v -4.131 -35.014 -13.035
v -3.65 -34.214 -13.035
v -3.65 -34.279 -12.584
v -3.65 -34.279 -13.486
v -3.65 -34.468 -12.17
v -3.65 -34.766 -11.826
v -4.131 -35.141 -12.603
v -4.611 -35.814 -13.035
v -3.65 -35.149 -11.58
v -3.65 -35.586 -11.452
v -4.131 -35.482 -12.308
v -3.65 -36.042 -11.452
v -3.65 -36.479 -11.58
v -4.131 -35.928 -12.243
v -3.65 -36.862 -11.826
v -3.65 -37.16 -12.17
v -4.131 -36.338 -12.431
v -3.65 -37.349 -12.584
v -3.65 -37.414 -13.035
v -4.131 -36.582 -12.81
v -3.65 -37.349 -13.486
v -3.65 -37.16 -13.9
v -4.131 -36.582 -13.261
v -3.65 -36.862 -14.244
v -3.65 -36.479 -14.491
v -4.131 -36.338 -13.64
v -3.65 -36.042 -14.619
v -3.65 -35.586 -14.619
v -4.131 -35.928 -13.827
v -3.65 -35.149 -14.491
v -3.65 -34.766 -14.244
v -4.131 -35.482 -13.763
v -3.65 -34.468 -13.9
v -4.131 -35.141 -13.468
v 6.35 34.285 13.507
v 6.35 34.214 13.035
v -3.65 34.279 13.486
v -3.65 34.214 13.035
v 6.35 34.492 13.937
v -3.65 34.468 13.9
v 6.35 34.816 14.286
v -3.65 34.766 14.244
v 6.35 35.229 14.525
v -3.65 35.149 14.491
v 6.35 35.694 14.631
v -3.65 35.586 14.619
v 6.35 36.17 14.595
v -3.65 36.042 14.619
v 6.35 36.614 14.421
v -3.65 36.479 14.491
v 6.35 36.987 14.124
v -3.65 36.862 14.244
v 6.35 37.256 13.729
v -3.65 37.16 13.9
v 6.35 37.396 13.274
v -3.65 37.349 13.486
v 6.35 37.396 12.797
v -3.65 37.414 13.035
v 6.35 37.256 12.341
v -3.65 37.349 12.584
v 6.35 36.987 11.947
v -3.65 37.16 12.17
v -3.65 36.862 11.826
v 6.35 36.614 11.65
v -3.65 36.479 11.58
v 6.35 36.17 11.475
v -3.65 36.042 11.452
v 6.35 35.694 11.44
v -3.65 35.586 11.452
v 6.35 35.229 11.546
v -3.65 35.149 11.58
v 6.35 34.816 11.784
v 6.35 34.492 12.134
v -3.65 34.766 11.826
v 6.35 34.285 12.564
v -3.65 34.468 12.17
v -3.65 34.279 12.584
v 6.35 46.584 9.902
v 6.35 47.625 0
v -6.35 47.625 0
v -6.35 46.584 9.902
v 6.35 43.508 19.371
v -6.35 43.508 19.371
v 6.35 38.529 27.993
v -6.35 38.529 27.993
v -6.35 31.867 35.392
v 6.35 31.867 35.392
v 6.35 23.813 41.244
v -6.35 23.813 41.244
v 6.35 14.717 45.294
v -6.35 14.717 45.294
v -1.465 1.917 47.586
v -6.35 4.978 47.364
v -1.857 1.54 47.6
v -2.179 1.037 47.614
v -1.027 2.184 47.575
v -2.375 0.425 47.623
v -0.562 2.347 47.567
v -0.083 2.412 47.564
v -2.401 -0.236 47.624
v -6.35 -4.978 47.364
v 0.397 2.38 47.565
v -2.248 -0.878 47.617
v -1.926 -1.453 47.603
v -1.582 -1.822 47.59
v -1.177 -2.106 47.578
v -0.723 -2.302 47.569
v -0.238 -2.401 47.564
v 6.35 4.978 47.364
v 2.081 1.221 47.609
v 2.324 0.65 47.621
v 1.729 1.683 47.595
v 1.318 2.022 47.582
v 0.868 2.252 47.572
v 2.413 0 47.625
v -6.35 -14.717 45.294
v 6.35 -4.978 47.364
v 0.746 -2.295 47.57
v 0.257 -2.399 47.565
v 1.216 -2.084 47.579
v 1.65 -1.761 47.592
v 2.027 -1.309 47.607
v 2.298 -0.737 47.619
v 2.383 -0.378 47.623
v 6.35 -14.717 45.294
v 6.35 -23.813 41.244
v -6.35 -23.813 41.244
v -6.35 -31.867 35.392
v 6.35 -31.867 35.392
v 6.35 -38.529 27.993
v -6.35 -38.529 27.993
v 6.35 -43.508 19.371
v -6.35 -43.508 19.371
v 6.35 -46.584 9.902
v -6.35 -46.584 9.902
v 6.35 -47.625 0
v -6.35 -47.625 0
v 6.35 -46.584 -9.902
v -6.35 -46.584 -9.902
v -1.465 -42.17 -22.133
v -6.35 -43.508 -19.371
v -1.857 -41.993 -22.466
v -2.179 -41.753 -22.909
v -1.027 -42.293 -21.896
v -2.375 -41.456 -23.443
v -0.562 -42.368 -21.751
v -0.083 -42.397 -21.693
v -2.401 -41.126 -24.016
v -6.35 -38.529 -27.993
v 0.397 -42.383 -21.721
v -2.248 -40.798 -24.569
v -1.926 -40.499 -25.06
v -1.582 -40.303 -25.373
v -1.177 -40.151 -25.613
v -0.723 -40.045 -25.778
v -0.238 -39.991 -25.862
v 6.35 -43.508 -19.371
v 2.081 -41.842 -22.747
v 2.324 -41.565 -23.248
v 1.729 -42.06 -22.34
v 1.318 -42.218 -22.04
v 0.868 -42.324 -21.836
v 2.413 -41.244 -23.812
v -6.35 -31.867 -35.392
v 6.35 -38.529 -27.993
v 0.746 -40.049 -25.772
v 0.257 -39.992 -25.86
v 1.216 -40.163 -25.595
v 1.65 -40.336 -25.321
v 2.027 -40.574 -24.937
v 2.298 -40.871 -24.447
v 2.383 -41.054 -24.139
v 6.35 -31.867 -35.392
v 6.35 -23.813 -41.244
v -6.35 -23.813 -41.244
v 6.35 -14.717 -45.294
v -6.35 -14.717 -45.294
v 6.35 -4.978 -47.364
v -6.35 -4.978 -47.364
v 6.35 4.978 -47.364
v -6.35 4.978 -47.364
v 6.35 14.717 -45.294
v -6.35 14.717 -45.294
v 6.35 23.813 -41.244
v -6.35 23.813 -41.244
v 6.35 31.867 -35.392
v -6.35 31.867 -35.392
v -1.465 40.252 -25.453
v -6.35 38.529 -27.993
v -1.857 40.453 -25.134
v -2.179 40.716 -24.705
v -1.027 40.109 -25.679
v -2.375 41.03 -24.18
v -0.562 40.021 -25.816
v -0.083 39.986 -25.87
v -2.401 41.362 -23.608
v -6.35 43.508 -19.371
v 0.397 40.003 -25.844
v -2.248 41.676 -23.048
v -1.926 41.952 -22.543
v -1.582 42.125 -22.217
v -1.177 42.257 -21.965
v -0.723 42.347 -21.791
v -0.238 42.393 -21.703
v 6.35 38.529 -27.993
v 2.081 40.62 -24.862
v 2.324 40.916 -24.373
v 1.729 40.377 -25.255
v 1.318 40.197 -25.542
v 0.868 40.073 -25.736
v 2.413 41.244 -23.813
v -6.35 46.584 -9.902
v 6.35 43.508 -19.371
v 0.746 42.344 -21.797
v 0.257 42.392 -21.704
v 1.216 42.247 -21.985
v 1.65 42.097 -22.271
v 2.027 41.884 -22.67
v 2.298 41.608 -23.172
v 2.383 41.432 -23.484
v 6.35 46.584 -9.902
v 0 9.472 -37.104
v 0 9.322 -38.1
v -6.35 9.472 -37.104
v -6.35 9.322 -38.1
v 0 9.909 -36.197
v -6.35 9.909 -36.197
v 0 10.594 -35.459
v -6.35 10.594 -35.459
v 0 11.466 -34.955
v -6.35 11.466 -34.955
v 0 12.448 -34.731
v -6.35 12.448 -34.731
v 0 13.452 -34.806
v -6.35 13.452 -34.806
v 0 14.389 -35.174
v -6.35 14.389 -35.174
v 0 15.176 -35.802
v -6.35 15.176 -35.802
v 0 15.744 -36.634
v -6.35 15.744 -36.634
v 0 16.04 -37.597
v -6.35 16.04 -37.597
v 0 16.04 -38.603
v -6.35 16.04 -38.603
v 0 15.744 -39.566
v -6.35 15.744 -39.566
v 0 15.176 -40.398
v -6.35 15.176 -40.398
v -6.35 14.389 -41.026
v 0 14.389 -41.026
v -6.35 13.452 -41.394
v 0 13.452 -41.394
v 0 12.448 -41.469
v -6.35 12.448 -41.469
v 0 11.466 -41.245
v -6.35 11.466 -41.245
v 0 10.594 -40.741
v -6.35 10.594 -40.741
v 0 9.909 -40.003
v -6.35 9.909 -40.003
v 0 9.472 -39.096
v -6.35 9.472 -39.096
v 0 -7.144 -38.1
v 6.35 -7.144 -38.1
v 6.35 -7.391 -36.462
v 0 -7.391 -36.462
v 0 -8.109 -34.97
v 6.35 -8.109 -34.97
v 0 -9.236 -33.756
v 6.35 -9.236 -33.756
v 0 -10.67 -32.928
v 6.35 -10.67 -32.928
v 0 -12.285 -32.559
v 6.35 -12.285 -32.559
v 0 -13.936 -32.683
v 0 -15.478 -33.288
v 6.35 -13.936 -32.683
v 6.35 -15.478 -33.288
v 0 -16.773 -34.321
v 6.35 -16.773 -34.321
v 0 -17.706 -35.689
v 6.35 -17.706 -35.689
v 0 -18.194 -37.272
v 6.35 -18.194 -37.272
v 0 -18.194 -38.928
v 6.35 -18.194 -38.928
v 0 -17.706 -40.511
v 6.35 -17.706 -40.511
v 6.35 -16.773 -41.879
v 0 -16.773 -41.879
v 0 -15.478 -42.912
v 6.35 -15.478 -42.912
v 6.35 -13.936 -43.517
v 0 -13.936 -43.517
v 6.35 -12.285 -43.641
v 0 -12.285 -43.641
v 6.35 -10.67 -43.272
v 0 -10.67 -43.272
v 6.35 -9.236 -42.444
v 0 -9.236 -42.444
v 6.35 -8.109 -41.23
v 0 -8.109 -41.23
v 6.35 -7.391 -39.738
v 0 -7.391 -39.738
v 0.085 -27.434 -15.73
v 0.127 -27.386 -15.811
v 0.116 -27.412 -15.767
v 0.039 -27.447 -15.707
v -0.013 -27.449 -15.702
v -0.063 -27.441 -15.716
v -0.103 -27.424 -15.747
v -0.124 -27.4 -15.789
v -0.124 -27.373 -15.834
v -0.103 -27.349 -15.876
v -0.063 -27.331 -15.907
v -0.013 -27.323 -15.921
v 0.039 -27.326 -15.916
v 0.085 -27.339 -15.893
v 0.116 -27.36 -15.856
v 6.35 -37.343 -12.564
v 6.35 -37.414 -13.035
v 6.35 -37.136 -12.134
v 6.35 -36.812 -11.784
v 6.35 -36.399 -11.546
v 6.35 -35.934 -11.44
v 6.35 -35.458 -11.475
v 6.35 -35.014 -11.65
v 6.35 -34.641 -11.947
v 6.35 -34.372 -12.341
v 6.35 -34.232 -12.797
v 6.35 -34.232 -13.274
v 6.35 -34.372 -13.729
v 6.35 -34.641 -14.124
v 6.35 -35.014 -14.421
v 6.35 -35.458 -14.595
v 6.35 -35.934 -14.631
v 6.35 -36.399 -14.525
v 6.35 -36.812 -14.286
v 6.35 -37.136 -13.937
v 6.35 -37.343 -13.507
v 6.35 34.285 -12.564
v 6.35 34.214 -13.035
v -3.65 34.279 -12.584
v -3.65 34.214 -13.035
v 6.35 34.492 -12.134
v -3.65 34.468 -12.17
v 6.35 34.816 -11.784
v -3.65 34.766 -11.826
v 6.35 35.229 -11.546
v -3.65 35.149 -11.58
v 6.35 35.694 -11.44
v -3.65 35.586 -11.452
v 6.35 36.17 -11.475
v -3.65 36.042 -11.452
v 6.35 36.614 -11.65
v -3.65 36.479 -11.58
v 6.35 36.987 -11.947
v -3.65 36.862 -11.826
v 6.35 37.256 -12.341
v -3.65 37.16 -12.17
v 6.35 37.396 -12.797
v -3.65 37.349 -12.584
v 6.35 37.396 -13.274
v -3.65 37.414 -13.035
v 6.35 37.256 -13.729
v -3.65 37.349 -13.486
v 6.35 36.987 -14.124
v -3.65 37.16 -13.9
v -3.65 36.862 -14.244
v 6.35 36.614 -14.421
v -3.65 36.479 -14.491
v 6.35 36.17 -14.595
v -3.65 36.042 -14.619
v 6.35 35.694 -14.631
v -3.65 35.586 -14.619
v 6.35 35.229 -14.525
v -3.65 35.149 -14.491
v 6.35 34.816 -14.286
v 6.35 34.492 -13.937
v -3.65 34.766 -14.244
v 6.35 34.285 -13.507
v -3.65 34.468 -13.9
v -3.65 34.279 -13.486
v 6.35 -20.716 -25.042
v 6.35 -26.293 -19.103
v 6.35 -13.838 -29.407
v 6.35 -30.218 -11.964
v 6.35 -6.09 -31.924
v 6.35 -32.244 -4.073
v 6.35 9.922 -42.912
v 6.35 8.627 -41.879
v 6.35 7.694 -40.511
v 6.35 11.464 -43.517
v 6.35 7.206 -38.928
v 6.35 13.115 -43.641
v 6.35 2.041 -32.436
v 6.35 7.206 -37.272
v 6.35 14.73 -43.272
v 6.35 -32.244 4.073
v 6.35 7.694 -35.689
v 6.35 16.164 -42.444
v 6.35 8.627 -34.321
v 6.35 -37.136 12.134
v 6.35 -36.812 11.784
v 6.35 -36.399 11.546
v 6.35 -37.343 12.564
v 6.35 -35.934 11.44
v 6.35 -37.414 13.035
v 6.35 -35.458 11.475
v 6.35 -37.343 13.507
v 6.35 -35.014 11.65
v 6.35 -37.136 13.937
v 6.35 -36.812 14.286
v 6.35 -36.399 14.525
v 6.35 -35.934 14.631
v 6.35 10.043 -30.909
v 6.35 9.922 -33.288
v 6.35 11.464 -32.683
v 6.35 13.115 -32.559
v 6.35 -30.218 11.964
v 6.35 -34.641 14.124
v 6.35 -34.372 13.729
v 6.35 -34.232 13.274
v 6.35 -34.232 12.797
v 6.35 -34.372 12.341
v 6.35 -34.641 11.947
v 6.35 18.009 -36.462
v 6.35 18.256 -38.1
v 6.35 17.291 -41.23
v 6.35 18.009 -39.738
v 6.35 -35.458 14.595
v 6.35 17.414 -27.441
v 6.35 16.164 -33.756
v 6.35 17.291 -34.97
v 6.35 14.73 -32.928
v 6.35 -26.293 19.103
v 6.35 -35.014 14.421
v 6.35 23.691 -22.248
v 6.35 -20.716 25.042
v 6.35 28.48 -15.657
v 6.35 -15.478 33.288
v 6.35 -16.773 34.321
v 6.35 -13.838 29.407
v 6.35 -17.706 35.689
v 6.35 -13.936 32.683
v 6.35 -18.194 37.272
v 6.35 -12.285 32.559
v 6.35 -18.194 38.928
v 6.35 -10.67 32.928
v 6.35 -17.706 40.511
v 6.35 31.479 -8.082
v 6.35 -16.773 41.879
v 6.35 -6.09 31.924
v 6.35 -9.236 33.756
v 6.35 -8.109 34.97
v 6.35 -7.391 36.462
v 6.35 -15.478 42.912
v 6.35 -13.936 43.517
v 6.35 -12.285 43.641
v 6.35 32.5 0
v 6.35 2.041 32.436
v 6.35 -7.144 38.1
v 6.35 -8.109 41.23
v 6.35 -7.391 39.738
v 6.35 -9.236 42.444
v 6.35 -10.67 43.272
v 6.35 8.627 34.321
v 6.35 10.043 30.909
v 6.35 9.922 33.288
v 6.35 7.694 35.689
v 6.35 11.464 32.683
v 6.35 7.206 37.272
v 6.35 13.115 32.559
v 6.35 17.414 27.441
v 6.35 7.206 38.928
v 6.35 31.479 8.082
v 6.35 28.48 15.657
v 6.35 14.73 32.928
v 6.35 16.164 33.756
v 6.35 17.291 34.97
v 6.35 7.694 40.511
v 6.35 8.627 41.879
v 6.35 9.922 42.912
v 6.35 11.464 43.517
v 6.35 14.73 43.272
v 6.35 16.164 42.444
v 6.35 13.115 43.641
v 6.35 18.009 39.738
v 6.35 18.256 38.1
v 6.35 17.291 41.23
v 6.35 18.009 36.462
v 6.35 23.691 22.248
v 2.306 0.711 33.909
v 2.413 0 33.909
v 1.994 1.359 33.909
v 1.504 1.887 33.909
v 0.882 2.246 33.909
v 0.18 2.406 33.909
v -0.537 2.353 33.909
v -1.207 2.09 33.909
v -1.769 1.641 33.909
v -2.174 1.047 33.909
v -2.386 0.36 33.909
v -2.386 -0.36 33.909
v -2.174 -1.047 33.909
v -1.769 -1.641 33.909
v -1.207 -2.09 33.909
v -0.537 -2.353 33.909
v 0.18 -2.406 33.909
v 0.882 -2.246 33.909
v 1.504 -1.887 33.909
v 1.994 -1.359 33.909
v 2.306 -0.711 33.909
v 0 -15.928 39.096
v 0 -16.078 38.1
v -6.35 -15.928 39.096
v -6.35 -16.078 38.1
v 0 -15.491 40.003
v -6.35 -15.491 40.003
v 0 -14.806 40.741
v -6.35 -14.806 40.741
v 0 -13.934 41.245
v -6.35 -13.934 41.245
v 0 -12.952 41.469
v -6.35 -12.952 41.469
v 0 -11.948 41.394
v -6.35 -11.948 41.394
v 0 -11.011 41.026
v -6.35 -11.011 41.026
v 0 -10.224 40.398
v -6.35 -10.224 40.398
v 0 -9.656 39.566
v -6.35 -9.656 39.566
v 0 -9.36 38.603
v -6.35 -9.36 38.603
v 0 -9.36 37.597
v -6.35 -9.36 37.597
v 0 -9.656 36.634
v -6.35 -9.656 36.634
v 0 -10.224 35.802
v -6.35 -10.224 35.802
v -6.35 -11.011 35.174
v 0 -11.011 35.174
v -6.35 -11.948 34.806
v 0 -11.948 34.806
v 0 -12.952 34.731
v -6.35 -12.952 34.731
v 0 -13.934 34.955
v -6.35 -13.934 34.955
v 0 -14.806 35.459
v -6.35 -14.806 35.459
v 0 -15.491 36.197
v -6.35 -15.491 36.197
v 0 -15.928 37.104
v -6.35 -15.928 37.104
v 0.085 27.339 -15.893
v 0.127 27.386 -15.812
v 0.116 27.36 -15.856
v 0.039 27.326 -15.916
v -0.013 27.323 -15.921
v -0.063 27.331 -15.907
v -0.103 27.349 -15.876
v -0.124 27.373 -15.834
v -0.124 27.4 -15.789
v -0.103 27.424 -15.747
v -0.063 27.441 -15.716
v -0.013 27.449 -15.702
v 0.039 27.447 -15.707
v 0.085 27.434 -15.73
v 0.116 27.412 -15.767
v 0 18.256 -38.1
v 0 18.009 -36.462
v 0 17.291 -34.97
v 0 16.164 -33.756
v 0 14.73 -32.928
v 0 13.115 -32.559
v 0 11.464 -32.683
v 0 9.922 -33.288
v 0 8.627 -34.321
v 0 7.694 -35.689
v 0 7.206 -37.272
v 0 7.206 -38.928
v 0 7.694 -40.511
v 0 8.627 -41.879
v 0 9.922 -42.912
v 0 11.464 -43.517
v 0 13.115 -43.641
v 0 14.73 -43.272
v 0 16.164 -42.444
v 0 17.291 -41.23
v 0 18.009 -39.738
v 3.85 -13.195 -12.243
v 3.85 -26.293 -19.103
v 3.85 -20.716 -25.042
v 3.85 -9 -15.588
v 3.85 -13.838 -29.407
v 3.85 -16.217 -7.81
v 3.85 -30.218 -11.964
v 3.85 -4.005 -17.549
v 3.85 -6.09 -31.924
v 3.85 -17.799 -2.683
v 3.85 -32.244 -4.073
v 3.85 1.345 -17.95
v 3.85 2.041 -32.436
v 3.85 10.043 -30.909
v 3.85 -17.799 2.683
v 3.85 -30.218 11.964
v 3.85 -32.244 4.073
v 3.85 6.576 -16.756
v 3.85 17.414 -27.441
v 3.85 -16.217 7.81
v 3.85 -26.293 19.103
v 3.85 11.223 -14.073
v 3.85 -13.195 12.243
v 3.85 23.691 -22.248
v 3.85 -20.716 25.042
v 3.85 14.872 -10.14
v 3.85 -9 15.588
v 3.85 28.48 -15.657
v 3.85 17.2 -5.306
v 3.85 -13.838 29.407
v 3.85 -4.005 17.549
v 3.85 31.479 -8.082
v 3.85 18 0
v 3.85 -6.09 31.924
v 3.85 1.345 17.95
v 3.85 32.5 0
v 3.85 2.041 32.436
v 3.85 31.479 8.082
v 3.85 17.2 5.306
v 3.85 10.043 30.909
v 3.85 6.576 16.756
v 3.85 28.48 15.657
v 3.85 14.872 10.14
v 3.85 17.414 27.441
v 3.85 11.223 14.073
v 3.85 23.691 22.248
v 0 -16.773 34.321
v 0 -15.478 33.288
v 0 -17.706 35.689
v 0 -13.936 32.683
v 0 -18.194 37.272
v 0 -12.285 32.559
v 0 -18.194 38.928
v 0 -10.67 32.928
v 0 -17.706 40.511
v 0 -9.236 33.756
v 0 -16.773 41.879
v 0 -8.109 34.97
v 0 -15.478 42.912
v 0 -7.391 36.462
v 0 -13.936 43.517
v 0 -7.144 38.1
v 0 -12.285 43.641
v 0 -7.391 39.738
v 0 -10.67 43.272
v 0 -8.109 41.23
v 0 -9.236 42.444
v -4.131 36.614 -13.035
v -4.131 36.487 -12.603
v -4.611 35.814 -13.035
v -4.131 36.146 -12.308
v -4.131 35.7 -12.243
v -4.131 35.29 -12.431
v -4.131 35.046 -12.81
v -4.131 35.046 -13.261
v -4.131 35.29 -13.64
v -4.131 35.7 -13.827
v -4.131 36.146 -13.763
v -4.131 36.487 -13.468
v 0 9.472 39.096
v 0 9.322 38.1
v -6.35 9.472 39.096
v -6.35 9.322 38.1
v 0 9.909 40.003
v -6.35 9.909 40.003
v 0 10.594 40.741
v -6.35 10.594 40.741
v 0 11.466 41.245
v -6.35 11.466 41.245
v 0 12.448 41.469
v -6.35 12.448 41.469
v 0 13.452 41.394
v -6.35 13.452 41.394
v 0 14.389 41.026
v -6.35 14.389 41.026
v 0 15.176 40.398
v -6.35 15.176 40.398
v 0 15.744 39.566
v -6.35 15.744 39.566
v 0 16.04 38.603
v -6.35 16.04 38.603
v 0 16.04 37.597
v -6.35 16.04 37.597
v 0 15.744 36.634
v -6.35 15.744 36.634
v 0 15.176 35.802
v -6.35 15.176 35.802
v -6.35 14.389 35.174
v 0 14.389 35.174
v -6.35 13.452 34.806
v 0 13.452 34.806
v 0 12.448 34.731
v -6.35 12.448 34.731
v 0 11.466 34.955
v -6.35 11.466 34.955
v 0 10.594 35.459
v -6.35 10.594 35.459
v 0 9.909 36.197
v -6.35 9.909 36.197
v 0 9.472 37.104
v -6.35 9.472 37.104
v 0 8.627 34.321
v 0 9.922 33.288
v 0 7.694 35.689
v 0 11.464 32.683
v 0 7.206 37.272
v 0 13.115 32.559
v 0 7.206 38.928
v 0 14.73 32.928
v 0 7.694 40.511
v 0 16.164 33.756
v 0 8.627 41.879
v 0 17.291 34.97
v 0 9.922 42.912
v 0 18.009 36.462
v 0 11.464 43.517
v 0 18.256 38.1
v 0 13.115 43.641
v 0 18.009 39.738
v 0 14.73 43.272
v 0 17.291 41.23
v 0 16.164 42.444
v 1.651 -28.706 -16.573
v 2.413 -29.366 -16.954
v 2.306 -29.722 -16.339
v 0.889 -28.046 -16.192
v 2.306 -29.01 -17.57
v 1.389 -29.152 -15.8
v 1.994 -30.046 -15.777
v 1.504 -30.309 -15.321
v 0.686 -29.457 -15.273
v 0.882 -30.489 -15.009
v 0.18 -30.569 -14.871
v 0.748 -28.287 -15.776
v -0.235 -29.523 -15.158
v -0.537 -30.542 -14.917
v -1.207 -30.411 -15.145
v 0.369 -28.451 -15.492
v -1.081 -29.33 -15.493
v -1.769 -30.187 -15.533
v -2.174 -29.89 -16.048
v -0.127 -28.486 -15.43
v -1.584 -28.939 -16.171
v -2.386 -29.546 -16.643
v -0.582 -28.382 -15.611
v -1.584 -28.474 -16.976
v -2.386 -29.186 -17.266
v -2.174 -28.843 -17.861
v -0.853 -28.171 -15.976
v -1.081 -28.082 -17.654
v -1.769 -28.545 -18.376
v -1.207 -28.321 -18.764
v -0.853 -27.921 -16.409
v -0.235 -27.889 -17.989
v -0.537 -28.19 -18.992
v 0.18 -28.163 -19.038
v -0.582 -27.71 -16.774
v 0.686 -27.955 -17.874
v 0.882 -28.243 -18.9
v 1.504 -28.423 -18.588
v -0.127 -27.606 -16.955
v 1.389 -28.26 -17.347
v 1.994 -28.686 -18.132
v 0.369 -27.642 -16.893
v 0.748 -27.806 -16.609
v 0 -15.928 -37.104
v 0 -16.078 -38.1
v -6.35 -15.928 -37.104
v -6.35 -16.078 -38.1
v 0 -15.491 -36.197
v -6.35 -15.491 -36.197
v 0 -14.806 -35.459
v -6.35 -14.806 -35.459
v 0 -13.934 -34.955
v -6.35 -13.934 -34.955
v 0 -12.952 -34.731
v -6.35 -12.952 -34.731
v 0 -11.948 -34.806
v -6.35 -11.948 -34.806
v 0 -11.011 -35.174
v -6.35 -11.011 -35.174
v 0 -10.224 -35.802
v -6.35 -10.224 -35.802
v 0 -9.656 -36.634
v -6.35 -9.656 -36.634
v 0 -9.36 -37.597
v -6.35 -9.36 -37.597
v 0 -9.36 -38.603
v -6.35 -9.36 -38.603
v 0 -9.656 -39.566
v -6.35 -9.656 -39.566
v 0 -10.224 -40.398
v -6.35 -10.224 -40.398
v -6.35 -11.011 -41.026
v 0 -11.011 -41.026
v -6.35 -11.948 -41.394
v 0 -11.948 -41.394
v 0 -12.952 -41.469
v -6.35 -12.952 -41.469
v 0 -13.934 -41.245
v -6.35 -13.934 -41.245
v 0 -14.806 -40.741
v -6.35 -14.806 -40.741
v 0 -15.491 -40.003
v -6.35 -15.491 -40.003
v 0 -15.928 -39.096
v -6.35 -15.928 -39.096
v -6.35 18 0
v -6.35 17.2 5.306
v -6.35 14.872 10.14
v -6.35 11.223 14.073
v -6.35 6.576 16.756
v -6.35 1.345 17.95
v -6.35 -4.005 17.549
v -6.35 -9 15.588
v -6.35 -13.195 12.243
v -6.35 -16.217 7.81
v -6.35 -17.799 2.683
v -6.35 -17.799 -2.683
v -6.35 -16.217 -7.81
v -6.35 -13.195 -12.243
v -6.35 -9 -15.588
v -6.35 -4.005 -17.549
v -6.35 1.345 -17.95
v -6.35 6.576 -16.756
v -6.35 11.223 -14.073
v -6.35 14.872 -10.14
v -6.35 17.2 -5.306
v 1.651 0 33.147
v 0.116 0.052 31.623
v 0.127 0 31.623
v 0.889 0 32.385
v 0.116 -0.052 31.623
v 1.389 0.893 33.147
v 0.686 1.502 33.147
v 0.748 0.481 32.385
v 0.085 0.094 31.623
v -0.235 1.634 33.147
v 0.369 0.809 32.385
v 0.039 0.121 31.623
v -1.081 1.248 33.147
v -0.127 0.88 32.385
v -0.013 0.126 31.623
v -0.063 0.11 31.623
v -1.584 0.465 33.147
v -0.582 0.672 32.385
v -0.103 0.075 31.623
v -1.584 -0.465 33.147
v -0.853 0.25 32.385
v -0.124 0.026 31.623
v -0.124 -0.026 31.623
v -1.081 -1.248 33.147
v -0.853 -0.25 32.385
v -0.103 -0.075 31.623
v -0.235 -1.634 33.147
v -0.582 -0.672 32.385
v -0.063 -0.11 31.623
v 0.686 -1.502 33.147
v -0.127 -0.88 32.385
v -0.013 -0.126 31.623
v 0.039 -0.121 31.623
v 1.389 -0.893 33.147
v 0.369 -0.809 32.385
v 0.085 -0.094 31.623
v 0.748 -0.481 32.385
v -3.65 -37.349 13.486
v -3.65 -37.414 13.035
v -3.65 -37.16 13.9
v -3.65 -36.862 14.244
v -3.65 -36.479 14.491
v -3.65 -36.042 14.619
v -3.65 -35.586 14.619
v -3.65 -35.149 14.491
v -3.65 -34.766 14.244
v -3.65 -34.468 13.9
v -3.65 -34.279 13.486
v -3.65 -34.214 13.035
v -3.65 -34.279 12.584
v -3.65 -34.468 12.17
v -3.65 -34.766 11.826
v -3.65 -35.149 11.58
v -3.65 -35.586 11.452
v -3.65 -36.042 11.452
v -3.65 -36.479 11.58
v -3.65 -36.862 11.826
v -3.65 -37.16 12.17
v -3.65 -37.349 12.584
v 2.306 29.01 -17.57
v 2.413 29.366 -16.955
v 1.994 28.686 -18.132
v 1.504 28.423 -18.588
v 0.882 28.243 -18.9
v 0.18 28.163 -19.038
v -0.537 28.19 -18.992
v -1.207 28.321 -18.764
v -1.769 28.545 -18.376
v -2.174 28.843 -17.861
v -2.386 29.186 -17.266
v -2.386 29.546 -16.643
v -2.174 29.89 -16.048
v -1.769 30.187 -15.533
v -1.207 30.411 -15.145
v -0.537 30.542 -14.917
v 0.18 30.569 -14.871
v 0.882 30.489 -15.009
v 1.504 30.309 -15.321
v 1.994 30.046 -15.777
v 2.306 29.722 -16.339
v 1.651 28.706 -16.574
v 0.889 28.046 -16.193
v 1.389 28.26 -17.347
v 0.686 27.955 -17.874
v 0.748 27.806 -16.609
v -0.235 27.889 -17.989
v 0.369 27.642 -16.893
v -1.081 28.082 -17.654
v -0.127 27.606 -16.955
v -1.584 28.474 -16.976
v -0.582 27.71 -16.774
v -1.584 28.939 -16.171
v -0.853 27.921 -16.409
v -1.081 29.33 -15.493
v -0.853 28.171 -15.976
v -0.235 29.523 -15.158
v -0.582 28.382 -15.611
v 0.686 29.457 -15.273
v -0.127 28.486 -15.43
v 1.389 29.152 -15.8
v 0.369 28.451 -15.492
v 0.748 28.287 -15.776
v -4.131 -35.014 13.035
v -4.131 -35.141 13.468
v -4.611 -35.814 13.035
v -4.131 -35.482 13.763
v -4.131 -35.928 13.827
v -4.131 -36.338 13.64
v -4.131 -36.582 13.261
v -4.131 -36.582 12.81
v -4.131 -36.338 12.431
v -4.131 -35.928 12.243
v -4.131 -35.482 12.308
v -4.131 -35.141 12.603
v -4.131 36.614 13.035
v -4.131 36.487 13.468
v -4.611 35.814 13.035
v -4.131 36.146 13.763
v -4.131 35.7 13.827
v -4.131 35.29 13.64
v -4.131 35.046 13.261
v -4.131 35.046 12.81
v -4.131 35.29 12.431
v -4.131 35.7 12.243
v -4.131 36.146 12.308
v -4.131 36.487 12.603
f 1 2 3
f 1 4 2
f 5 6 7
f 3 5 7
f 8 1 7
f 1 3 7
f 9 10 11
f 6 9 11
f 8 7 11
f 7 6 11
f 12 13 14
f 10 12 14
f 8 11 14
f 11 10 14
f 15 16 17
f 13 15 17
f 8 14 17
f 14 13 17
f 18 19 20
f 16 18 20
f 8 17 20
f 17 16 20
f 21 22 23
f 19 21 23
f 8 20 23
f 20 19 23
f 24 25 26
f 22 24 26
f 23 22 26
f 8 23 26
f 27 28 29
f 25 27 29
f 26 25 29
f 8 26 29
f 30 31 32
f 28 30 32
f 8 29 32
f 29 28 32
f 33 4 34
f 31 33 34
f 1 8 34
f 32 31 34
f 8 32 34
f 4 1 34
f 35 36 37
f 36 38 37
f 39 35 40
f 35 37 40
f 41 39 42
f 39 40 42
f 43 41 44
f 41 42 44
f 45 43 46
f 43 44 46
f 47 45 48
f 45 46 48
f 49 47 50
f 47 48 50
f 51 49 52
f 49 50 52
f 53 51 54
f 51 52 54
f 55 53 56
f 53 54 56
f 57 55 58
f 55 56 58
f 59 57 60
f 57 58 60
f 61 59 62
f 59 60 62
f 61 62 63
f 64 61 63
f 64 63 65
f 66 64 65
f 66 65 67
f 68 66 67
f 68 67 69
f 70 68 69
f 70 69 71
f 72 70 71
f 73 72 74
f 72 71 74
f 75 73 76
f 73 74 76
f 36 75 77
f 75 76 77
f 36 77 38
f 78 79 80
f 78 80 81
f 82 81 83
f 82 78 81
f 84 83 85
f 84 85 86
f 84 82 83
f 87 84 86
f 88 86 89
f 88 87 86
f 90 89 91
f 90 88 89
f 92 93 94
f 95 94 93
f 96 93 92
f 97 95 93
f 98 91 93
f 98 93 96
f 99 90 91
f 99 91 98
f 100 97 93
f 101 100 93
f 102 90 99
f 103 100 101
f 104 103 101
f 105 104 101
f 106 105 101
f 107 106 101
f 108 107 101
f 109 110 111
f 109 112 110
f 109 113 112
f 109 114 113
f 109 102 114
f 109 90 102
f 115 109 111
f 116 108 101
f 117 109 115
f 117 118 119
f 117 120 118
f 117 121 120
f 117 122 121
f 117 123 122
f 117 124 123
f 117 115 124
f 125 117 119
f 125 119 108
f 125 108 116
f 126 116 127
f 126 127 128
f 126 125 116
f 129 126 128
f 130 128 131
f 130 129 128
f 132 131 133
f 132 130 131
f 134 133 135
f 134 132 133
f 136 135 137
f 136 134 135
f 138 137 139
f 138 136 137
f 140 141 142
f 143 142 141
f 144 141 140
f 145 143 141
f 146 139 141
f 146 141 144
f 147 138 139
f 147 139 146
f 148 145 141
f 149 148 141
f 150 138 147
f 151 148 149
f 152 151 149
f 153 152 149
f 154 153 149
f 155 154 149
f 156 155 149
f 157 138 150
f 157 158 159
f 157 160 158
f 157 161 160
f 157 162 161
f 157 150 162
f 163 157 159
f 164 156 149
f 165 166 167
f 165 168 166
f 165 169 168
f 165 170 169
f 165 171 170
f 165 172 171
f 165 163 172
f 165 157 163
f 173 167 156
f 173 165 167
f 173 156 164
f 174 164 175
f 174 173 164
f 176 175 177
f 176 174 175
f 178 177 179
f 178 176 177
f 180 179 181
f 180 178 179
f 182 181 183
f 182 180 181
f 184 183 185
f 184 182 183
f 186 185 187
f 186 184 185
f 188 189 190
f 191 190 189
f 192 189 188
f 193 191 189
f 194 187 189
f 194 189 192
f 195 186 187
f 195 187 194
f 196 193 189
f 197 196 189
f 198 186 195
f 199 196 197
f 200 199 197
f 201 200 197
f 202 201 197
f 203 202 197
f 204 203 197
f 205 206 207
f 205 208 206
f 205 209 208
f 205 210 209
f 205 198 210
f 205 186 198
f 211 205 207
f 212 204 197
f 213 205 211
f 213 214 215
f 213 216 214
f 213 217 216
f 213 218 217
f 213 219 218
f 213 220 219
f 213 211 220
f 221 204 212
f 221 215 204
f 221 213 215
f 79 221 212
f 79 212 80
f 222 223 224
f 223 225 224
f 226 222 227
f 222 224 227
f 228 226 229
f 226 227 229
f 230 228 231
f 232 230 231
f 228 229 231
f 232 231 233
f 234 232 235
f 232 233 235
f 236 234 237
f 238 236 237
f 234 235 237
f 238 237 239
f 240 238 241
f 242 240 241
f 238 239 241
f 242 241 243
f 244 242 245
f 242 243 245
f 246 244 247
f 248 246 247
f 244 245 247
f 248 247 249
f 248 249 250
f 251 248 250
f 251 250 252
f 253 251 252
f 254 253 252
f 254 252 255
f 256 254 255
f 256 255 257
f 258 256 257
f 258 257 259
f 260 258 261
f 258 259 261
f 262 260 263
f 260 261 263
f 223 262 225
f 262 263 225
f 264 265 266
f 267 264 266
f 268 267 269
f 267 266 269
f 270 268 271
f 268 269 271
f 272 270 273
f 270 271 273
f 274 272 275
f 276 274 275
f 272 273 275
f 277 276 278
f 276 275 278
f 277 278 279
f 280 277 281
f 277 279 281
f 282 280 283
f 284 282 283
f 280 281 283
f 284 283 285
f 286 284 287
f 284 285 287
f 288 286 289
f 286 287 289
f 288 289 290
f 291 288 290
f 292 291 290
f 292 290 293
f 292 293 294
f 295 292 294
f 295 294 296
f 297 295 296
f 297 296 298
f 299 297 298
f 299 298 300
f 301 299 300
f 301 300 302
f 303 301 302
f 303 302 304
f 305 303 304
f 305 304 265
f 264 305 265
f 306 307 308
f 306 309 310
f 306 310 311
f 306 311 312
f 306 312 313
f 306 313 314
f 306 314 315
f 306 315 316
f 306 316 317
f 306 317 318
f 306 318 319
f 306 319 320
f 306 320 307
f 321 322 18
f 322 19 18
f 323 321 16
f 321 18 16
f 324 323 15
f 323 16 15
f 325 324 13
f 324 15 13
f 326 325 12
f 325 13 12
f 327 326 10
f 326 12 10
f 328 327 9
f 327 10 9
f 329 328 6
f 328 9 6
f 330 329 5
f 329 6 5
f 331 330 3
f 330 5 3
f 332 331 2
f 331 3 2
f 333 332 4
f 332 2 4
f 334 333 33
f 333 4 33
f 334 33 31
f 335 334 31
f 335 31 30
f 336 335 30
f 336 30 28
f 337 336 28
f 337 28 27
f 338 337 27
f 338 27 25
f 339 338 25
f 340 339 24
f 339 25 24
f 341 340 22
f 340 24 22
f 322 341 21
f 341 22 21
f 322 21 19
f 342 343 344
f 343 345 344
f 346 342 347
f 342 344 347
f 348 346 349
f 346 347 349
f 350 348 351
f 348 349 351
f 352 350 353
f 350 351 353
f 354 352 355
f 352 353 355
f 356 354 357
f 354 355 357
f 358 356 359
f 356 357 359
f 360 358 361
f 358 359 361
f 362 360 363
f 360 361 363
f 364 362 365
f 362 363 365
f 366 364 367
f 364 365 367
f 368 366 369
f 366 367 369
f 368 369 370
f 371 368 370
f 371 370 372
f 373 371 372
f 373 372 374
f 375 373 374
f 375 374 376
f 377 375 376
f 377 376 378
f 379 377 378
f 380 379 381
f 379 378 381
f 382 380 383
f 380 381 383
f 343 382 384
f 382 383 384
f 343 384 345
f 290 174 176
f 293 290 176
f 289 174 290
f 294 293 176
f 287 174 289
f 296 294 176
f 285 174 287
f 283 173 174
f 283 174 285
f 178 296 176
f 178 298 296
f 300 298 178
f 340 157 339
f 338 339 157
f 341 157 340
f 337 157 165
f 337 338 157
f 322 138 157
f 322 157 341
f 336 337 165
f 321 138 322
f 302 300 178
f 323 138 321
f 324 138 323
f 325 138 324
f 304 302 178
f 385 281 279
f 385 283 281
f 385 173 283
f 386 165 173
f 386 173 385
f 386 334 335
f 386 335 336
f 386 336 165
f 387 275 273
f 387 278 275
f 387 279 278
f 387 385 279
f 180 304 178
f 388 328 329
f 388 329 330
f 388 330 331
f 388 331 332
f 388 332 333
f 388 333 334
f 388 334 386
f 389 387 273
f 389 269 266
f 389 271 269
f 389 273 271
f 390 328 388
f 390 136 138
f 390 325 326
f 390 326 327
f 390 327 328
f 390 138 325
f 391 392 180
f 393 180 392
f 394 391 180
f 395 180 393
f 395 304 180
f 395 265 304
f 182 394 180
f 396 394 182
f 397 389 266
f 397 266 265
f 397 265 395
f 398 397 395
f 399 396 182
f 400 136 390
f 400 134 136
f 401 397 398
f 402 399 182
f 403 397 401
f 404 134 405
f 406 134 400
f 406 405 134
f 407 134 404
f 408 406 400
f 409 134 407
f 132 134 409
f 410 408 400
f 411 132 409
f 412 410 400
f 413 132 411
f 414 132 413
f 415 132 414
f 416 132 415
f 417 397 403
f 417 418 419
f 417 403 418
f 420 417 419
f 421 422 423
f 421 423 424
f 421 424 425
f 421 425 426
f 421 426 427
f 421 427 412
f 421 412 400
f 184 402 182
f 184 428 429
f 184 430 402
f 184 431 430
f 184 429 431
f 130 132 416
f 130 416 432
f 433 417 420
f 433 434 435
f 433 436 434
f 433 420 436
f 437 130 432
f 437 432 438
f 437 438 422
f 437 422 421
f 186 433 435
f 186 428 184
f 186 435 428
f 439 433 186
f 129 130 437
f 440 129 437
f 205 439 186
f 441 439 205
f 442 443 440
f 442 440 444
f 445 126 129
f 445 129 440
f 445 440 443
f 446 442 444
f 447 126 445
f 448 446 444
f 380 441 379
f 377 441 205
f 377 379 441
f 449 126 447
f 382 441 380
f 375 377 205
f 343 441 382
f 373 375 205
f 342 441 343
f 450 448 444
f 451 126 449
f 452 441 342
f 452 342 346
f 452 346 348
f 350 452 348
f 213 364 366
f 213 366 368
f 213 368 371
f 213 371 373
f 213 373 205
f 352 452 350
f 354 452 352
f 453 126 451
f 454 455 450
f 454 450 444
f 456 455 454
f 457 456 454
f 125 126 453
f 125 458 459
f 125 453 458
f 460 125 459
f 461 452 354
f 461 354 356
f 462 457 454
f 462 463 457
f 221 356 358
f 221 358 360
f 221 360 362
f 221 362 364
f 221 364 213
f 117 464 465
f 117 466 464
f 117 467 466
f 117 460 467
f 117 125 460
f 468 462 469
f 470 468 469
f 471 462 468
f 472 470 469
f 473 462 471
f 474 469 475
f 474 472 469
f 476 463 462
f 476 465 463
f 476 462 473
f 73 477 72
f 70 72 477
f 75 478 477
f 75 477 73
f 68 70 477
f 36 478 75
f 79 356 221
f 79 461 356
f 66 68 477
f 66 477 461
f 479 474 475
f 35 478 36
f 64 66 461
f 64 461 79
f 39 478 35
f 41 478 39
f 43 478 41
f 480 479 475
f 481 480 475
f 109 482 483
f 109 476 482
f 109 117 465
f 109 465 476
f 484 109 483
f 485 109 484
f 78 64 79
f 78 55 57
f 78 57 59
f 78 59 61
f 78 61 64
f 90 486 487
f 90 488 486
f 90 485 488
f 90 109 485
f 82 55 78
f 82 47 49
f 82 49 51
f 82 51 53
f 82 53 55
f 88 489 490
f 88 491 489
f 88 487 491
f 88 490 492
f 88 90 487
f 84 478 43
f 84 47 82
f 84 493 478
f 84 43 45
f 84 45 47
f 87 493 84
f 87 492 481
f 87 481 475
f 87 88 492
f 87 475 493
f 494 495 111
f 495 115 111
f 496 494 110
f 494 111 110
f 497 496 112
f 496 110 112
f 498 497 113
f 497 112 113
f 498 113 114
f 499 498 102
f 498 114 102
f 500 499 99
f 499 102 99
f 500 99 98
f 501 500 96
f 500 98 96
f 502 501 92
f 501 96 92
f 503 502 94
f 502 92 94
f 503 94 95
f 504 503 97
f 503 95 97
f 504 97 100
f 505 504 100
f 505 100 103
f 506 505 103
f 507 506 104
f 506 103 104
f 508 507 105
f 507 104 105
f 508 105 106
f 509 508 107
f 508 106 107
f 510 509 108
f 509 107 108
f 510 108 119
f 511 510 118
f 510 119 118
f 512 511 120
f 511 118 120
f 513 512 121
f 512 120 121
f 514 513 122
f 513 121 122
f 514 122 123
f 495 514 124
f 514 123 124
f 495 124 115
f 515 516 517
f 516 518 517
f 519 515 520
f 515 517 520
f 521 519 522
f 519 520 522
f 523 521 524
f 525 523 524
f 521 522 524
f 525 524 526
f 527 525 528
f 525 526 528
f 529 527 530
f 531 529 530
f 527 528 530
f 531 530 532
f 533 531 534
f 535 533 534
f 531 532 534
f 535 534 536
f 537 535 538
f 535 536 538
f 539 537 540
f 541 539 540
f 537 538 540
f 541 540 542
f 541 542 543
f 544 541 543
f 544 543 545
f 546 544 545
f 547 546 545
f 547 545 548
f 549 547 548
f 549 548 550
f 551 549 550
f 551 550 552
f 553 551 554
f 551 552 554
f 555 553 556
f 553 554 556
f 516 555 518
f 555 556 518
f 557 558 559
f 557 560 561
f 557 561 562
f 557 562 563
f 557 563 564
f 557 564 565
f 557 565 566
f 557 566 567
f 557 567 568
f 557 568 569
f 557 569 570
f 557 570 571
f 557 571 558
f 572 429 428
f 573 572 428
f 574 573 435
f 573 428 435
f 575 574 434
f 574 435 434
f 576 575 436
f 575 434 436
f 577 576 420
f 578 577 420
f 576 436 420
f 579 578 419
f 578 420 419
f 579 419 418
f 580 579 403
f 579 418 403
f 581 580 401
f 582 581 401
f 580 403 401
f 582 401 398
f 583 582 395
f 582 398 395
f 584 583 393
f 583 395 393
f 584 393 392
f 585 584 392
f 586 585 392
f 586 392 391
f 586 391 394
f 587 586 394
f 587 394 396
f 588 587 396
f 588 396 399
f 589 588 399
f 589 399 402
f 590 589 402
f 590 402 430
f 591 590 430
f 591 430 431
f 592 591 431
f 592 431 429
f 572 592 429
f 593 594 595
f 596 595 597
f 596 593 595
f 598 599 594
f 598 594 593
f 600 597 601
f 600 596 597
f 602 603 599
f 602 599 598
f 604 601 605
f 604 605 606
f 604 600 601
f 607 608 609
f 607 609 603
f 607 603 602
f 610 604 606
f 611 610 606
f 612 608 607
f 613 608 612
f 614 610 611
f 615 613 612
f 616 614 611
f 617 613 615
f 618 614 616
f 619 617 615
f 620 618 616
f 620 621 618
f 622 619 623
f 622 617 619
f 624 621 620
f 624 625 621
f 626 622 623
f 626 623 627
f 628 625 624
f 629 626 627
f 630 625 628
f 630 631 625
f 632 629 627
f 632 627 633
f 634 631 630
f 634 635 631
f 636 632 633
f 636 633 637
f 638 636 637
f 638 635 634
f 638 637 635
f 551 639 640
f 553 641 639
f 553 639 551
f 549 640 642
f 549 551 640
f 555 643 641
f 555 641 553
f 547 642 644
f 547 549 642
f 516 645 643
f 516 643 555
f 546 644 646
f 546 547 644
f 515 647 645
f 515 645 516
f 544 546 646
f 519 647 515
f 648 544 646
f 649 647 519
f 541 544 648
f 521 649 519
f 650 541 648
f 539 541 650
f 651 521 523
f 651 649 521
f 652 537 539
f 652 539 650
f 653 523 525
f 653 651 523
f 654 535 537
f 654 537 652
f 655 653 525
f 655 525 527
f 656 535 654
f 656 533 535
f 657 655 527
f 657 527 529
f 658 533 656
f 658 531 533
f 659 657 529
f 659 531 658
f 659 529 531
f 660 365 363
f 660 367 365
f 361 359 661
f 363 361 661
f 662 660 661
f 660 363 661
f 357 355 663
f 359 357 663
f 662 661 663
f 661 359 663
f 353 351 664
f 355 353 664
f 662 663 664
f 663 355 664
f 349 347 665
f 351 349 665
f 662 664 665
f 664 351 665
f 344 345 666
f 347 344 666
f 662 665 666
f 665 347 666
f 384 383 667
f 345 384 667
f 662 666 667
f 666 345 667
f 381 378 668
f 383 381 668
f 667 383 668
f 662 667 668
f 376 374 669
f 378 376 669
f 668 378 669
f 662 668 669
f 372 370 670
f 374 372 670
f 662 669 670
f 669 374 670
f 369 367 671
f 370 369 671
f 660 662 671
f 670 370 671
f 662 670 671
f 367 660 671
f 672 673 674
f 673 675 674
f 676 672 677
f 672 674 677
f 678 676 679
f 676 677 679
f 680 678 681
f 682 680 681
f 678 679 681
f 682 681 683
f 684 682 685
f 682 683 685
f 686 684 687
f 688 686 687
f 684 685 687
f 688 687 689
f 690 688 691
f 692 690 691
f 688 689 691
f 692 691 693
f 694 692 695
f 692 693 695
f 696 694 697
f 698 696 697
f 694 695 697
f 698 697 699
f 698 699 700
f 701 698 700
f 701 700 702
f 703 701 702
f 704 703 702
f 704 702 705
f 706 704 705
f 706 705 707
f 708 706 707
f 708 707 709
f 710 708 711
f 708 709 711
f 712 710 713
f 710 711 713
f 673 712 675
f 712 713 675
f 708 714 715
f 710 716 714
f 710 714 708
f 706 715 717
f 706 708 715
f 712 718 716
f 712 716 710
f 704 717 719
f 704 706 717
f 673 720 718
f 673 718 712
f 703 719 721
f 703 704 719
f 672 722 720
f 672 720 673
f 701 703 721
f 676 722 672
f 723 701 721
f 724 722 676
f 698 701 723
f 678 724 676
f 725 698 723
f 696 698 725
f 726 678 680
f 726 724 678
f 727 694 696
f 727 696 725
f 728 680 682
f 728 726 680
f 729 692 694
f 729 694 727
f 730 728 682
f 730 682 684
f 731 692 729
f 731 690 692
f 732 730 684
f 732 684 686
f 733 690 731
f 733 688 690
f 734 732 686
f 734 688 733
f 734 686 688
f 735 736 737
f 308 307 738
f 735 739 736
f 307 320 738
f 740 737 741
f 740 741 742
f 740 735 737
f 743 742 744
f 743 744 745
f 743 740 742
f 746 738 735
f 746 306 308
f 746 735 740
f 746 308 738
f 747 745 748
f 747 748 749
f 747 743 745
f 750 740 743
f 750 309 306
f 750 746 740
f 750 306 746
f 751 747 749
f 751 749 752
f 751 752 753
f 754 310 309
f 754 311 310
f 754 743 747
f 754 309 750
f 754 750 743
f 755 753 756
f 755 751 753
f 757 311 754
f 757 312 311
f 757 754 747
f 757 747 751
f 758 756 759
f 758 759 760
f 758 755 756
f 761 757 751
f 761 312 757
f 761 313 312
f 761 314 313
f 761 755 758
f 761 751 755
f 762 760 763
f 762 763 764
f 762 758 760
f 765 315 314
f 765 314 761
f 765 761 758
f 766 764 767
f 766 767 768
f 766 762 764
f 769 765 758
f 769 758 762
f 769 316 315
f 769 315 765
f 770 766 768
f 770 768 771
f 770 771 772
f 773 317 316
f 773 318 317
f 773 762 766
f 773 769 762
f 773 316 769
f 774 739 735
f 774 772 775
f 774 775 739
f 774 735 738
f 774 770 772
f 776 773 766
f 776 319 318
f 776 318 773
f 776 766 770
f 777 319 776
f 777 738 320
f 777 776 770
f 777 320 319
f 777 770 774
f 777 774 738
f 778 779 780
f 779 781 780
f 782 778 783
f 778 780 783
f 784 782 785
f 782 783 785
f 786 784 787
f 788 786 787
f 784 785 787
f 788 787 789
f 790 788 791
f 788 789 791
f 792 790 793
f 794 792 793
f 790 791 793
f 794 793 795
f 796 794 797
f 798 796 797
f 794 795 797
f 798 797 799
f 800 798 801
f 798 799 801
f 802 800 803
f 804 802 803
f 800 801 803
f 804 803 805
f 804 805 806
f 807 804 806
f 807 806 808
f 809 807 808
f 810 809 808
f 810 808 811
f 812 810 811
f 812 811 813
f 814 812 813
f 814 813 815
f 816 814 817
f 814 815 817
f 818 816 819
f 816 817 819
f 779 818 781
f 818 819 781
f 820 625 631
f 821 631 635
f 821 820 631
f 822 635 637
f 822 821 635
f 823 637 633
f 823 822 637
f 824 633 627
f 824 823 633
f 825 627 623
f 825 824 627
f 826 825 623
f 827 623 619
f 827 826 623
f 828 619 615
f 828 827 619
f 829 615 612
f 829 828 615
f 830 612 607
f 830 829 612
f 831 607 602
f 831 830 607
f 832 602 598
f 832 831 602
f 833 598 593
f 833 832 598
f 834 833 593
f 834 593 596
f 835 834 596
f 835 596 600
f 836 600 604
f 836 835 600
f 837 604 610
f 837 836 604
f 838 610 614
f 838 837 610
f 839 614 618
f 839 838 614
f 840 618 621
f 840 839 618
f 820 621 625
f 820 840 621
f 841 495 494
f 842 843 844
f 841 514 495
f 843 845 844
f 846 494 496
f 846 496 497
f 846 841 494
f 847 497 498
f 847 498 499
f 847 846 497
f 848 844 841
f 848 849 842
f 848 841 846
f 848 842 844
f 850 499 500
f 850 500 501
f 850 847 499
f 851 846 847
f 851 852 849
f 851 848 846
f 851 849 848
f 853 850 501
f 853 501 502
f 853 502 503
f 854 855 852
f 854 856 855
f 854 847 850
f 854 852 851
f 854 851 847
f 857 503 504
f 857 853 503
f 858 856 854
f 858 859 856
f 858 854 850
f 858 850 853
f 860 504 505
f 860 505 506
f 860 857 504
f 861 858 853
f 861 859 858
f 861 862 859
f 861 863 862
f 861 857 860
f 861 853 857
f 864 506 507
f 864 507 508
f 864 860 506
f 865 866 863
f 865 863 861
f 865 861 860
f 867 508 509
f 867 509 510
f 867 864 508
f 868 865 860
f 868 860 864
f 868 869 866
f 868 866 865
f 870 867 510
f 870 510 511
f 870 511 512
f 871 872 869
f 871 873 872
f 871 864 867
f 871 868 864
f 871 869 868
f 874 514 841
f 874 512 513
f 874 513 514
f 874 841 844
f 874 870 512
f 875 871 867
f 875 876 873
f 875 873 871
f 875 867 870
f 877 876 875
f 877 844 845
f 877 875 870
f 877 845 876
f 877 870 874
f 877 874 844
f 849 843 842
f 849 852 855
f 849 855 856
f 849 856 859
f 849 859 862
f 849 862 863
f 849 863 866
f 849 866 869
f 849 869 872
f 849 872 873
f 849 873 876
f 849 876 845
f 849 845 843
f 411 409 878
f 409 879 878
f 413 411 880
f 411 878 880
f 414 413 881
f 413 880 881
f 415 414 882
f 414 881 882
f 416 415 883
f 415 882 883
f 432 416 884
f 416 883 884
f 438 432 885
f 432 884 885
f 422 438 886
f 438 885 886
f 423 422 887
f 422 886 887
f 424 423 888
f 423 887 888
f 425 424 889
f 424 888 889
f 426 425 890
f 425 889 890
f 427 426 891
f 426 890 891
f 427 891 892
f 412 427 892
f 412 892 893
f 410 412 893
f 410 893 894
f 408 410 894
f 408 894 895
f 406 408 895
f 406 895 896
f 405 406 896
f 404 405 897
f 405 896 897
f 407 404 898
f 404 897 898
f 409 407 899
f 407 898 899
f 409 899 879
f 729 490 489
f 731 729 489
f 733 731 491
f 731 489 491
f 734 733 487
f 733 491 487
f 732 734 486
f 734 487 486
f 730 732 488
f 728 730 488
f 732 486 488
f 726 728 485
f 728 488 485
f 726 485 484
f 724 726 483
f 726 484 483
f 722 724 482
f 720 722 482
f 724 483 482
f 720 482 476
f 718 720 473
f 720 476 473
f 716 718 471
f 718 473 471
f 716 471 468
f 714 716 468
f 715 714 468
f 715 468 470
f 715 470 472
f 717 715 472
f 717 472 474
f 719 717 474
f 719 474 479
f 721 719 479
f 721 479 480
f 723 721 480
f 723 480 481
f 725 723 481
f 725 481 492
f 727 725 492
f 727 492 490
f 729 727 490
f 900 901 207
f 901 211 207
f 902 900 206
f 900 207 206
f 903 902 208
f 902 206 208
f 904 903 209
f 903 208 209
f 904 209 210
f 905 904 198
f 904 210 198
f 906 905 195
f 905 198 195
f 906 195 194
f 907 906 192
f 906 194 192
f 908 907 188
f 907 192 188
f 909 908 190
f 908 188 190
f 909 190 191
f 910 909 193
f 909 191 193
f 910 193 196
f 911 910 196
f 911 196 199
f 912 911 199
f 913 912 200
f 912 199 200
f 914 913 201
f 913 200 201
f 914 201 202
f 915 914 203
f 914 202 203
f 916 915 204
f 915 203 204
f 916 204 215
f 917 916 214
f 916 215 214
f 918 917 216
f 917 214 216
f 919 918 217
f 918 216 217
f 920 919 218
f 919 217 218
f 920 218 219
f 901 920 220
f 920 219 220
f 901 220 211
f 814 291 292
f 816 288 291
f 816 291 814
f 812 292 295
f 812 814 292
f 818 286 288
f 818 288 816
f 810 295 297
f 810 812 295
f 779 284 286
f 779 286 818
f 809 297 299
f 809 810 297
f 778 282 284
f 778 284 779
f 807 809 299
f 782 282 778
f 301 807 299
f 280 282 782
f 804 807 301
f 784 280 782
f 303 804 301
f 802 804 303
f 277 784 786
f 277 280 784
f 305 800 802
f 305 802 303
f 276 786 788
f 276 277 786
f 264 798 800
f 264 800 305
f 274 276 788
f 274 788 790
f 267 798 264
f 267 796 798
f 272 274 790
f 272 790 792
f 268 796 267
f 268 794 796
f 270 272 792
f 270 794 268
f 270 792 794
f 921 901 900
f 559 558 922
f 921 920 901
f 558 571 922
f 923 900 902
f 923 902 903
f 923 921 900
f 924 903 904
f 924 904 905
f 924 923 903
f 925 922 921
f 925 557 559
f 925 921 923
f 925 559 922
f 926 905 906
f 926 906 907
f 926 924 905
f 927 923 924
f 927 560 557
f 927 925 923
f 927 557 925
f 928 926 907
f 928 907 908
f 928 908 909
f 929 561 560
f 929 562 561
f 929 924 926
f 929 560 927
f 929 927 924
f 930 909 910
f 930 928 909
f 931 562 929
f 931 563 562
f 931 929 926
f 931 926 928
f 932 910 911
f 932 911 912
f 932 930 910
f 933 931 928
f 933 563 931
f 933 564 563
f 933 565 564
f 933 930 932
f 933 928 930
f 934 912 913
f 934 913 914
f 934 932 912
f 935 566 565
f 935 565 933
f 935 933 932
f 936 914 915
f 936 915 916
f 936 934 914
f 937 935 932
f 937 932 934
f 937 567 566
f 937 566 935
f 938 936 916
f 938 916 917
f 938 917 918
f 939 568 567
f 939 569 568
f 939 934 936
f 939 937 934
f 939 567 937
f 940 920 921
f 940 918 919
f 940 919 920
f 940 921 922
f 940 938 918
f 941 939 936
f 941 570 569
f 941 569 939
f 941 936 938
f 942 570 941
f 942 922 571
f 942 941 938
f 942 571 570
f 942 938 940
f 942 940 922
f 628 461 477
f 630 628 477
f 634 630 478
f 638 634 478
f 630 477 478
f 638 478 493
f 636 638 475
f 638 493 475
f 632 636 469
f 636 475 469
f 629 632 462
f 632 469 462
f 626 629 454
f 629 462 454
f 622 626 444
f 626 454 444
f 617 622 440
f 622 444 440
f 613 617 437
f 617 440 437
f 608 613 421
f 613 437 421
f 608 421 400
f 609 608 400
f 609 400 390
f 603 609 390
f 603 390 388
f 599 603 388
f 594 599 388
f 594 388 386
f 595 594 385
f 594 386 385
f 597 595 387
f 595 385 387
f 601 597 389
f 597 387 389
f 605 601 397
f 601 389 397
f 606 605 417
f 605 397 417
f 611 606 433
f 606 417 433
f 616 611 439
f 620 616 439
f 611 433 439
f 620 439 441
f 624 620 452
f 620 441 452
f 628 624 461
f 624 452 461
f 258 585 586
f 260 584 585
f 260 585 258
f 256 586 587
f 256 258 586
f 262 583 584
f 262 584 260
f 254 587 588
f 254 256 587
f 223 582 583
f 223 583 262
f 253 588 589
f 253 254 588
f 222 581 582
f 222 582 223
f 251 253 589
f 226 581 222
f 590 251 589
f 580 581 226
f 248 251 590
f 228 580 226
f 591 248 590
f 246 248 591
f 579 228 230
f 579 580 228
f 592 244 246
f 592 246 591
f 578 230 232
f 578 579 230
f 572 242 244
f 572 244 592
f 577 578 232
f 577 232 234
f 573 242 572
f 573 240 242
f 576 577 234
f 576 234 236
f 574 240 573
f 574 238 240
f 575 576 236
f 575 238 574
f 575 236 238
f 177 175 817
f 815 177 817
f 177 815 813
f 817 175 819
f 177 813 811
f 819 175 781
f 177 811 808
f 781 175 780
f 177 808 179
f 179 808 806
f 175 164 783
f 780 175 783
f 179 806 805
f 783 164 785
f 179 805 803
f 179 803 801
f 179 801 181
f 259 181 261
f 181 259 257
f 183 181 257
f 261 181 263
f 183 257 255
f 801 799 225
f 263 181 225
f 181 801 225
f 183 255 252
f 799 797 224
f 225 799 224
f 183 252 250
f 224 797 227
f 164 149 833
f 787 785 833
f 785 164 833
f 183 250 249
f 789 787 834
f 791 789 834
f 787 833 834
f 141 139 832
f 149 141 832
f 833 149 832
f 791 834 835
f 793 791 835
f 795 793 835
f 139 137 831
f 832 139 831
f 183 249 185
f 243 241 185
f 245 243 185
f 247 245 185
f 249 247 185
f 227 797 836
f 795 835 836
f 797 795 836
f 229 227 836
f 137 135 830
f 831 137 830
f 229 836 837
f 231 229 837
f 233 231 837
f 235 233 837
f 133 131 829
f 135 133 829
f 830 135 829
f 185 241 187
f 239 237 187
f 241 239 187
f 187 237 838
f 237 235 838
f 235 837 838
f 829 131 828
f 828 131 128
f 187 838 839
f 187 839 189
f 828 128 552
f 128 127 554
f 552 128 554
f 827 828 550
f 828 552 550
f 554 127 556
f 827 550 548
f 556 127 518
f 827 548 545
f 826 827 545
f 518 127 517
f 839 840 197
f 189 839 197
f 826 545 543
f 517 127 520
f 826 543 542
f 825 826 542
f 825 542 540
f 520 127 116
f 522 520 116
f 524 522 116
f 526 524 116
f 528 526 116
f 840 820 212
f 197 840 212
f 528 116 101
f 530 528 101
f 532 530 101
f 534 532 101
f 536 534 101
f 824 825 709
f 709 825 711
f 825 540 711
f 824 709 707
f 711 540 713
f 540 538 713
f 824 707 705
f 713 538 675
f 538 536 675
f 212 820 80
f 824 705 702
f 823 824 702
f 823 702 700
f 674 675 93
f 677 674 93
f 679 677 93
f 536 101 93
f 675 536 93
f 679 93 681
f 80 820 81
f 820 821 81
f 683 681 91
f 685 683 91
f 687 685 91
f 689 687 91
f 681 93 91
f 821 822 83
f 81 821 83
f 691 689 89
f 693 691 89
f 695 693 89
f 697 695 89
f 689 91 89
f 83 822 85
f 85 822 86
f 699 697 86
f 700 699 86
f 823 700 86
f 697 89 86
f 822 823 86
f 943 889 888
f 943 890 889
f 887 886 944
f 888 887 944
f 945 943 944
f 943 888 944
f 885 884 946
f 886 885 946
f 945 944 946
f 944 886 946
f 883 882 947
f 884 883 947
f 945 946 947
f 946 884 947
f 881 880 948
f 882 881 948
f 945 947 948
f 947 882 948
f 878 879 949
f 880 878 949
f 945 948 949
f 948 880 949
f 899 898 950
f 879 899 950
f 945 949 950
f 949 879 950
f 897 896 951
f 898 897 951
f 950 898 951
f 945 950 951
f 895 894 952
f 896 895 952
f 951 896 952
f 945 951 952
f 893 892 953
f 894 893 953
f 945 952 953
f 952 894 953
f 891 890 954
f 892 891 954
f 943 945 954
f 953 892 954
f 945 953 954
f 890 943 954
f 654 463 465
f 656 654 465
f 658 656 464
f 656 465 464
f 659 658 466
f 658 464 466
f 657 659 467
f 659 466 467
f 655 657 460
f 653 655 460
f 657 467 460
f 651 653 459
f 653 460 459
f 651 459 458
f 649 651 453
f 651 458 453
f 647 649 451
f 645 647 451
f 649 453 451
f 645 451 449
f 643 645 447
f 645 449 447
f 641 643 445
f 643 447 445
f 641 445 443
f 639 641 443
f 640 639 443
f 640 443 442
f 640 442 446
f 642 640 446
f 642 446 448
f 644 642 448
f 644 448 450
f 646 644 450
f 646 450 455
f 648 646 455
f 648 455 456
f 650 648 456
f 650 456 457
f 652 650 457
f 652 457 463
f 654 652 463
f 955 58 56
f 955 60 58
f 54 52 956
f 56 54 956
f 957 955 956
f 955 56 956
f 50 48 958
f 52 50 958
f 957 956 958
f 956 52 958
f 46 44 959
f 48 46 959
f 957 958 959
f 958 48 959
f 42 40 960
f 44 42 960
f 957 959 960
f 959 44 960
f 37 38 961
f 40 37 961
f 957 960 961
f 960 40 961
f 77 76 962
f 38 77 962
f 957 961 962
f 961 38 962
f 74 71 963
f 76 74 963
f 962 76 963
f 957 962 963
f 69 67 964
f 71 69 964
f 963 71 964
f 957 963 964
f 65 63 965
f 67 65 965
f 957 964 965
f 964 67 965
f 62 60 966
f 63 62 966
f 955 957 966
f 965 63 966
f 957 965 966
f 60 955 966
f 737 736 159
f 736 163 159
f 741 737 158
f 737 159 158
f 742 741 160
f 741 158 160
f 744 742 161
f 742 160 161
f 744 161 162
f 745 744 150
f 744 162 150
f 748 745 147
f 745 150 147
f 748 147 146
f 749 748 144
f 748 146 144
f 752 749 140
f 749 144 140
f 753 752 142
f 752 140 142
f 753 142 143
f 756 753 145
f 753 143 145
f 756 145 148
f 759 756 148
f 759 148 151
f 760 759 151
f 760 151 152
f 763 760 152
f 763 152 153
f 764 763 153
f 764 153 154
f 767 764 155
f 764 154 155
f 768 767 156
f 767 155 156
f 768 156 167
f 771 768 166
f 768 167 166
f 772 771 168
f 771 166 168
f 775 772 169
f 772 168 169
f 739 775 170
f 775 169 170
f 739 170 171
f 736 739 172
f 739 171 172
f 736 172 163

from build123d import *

# Parameters (mm, degrees)
F0_R           = 47.625
F0_R_2         = 18
F1_DEPTH       = 6.35
F2_R           = 32.5
F3_DEPTH       = 2.5
F5_D           = 3.2
F5_DEPTH       = 10
F5_TIP         = 0.9613769904
F7_D           = 6.7564
F7_CBORE_D     = 11.1125
F7_CBORE_DEPTH = 6.35
F9_R           = 2.413
F10_DEPTH      = 16.002
F11_SIZE       = 2.286
F13_COUNT      = 3
F13_ANGLE      = 240


with BuildPart() as f1:
    # F0 (on Right) → F1 (new body, symmetric)
    with BuildSketch(Plane.YZ):
        Circle(F0_R)
        Circle(F0_R_2, mode=Mode.SUBTRACT)
    extrude(amount=F1_DEPTH, both=True)

    # F2 (on face) → F3 (cut)
    with BuildSketch(Plane.YZ.offset(6.35)):
        Circle(F2_R)
    extrude(amount=-F3_DEPTH, mode=Mode.SUBTRACT)

    # F5
    with Locations(Plane.YZ.offset(6.35)):
        with Locations((-35.814, 13.03522997), (35.814, 13.03522997), (35.814, -13.03522997), (-35.814, -13.03522997)):
            Hole(F5_D / 2, depth=F5_DEPTH)
            with Locations((0, 0, -(F5_DEPTH + F5_TIP / 2))):  # 118° drill point
                Cone(0, F5_D / 2, F5_TIP, mode=Mode.SUBTRACT)

    # F7 (through all)
    with Locations(Plane.YZ.offset(6.35)):
        with Locations((-12.7, 38.1), (12.7, 38.1), (-12.7, -38.1), (12.7, -38.1)):
            CounterBoreHole(F7_D / 2, F7_CBORE_D / 2, F7_CBORE_DEPTH)


with BuildPart() as f10:
    # F9 (on offset) → F10 (new body, symmetric)
    with BuildSketch(Plane.XY.offset(47.625)):
        Circle(F9_R)
    extrude(amount=F10_DEPTH, both=True)

    # F11
    f11_edges = [f10.edges().sort_by_distance(p)[0] for p in [
        (-2.413, 0, 31.623),
    ]]
    chamfer(f11_edges, length=F11_SIZE)


with BuildPart() as f13_1:
    # F13: instance of F10
    add(f10.part.rotate(Axis((0.1950263977, 0, 0), (1, 0, 0)), 1 * F13_ANGLE / (F13_COUNT - 1)))


with BuildPart() as f13_2:
    # F13: instance of F10
    add(f10.part.rotate(Axis((0.1950263977, 0, 0), (1, 0, 0)), 2 * F13_ANGLE / (F13_COUNT - 1)))


with BuildPart() as f1_1:
    add(f1.part)

    # F14: cut F10, F13_1, F13_2
    add(f10.part, mode=Mode.SUBTRACT)
    add(f13_1.part, mode=Mode.SUBTRACT)
    add(f13_2.part, mode=Mode.SUBTRACT)


solid = f1_1.part
